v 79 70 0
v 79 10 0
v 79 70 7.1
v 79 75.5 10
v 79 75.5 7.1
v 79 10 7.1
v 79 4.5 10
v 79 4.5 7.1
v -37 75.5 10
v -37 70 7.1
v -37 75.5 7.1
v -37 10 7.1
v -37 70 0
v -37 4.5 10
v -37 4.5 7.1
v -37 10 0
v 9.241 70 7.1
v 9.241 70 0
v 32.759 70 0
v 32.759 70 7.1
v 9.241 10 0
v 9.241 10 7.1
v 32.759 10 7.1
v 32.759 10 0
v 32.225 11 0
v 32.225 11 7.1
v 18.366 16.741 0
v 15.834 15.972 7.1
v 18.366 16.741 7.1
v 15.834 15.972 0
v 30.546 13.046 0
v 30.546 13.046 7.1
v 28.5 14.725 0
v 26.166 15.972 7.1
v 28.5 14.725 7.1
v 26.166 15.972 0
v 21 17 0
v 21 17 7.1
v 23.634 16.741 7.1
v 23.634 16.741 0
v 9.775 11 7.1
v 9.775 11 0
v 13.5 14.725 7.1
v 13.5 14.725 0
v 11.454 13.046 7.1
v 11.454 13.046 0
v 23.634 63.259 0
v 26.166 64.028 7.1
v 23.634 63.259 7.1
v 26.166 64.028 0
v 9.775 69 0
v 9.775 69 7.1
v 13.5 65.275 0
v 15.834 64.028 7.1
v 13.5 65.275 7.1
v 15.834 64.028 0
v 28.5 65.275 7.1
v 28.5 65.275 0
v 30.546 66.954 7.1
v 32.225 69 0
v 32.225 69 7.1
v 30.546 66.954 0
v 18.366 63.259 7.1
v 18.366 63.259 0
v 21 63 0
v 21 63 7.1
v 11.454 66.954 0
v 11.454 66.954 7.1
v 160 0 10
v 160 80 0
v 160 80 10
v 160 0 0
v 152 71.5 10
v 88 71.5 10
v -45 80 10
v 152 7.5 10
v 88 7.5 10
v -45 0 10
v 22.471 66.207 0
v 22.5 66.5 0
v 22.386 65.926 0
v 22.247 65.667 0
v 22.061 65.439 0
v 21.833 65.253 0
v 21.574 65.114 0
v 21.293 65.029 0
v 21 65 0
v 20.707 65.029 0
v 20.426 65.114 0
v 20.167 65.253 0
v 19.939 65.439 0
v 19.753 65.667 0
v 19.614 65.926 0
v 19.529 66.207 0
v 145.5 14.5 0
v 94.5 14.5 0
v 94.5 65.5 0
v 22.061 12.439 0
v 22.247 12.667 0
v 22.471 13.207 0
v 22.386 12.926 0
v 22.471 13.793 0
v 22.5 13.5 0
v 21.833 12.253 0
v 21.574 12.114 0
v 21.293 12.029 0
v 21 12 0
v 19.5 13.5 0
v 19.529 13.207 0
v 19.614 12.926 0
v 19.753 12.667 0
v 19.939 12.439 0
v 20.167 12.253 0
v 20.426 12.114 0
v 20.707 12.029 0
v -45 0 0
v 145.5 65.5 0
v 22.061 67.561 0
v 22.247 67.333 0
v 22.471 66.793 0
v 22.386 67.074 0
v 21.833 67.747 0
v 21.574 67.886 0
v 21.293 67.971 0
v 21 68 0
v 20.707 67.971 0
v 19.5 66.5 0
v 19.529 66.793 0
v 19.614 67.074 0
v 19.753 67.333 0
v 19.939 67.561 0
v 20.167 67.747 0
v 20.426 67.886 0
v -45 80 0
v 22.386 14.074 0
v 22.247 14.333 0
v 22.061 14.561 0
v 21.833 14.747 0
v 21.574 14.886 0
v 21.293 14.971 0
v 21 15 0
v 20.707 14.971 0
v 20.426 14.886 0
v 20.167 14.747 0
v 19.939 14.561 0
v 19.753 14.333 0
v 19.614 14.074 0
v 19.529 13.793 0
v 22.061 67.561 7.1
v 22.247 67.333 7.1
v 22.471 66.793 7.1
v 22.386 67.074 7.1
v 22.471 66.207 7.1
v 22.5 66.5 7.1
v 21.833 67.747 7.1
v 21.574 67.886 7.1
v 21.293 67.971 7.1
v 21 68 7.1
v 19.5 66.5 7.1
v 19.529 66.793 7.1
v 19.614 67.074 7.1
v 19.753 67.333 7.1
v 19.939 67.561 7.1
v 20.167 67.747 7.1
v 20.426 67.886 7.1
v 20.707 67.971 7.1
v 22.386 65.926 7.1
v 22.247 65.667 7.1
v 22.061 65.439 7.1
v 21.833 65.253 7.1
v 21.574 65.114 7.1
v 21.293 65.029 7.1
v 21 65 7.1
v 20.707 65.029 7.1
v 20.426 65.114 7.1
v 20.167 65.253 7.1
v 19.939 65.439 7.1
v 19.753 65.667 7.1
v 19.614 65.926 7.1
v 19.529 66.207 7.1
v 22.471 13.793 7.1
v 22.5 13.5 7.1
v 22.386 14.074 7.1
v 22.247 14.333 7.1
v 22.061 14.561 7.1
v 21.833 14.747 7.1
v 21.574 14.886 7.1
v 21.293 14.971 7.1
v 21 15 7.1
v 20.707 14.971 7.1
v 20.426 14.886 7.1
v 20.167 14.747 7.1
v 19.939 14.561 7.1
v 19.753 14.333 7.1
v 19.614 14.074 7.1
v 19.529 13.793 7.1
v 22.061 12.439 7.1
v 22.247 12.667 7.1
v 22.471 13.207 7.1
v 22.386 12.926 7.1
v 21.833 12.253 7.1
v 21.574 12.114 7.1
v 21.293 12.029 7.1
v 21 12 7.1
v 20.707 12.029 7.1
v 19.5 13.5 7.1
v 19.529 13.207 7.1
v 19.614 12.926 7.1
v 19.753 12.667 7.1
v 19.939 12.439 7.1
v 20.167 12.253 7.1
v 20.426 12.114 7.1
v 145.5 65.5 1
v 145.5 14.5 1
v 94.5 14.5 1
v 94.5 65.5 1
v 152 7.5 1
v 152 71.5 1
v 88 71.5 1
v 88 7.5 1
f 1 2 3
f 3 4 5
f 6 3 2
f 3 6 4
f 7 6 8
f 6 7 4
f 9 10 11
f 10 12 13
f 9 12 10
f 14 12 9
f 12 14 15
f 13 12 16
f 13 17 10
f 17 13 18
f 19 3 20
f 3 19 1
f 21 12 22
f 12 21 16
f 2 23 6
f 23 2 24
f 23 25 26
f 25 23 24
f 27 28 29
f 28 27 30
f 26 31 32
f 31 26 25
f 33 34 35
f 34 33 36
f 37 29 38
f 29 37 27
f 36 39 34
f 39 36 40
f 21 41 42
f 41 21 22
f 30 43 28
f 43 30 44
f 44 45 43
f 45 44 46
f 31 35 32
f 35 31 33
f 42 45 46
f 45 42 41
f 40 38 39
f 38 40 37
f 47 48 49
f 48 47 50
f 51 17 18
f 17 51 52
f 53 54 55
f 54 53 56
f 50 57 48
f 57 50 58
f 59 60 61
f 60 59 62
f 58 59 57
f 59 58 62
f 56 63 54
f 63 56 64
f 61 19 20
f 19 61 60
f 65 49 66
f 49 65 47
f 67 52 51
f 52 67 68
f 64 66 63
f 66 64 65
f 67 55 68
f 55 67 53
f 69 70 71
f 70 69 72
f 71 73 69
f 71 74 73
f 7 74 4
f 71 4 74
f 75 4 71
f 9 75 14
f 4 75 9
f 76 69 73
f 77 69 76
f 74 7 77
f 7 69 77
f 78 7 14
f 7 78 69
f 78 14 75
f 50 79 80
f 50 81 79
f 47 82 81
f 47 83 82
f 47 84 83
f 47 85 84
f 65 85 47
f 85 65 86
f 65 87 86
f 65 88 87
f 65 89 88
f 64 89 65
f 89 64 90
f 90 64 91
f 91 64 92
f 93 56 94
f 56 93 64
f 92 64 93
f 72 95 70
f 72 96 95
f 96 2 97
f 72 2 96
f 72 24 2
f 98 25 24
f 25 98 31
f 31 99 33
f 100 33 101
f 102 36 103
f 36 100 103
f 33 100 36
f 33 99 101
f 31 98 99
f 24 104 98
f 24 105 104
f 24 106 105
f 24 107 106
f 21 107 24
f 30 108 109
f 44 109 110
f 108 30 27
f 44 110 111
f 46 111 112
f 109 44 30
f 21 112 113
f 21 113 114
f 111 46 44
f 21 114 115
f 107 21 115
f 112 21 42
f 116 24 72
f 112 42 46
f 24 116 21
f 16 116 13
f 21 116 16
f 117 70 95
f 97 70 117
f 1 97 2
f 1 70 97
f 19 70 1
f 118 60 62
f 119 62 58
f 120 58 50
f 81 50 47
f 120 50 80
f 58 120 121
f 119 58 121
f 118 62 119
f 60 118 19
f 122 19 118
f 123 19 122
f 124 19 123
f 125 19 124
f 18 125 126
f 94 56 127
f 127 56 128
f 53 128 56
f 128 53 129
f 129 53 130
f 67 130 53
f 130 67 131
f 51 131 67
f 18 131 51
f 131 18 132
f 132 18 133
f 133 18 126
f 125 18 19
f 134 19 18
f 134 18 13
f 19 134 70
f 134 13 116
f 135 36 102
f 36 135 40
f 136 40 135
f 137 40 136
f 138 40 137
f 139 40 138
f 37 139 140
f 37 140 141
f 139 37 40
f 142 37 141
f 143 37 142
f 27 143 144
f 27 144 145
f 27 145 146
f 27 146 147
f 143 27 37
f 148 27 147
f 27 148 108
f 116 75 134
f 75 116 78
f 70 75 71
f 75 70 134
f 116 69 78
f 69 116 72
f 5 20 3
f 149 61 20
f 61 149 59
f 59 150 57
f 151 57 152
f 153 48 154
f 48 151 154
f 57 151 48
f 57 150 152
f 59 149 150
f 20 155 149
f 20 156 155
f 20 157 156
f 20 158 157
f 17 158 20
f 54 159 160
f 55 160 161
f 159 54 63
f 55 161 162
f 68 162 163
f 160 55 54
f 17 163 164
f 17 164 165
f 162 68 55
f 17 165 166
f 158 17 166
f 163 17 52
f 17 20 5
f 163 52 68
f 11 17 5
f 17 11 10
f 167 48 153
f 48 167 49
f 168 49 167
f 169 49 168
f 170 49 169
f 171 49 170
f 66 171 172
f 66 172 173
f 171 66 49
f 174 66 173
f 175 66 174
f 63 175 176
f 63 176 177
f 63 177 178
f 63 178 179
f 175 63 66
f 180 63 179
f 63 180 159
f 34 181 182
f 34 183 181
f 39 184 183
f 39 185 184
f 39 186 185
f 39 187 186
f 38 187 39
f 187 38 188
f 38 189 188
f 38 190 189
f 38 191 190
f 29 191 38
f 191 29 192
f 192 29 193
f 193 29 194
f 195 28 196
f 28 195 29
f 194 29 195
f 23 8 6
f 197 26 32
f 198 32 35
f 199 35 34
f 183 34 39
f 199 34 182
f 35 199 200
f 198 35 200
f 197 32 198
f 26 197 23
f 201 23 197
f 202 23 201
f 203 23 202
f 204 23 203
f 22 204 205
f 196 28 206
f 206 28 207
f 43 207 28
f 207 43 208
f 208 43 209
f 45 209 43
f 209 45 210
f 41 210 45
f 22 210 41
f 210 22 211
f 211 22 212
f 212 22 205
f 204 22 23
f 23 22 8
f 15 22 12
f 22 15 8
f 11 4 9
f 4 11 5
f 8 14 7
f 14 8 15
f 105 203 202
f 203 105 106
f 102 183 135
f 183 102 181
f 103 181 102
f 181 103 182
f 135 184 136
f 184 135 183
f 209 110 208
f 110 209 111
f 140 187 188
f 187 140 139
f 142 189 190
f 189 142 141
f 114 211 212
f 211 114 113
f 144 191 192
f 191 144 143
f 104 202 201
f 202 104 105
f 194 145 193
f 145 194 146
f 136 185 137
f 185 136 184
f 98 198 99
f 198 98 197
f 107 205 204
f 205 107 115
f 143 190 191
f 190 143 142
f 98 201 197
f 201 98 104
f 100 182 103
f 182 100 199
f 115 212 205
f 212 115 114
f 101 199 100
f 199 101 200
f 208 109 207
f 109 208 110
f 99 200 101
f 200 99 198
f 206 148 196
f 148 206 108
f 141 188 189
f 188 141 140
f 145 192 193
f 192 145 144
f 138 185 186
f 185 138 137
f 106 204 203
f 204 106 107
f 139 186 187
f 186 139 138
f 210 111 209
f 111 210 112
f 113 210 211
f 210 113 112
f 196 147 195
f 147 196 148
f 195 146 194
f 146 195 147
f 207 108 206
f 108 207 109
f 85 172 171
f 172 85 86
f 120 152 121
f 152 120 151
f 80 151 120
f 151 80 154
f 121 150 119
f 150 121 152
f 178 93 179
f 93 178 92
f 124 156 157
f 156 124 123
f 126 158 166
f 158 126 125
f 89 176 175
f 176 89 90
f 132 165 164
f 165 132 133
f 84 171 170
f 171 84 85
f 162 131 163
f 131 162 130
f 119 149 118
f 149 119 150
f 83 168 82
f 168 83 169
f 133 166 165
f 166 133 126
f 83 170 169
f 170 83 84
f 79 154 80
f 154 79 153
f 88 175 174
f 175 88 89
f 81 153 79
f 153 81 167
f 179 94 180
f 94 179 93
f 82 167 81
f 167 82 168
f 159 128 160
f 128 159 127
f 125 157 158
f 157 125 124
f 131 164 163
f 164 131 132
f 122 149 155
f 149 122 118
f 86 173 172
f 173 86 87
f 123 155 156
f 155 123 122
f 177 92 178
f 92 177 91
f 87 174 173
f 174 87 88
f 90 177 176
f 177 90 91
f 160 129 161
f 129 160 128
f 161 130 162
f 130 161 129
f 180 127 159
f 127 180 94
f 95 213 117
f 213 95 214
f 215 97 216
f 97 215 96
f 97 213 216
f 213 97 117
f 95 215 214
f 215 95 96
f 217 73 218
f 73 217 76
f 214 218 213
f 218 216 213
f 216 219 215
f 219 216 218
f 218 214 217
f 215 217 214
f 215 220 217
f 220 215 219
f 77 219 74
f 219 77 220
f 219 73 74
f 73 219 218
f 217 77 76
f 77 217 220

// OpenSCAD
difference(){
    translate([-45,0,0])
    cube([205,80,10]);
    //translate([(160-116)/2,(80-71)/2,7.1])
    
    translate([-37,(80-71)/2,7.1])
    cube([116,71,3]);
    
    difference(){
        translate([-37,(80-60)/2,-2])
        cube([116,60,15]);    
        
        translate([116/2-37,3.5,-1])
        cylinder(r=13.5, h=12, $fn=32);
        
        translate([116/2-37,80-3.5,-1])
        cylinder(r=13.5, h=12, $fn=32);        
    }
    
    translate([116/2-37,13.5,-1])
    cylinder(r=1.5, h=12, $fn=32);
    
    translate([116/2-37,80-13.5,-1])
    cylinder(r=1.5, h=12, $fn=32);
    
    translate([88+(64-51)/2, (80-51)/2, -1])
    cube([51, 51, 10]);    
    
    translate([88, (80-65)/2, 1])
    cube([64, 64, 12]);        
}
 // TODO: check radius

/*
difference(){
    translate([45-3,0,0])
    cube([6, 80, 3]);
    
    translate([45, 80/2, -1])
    cylinder(r=1.6, h=20, $fn=32);
} */   
